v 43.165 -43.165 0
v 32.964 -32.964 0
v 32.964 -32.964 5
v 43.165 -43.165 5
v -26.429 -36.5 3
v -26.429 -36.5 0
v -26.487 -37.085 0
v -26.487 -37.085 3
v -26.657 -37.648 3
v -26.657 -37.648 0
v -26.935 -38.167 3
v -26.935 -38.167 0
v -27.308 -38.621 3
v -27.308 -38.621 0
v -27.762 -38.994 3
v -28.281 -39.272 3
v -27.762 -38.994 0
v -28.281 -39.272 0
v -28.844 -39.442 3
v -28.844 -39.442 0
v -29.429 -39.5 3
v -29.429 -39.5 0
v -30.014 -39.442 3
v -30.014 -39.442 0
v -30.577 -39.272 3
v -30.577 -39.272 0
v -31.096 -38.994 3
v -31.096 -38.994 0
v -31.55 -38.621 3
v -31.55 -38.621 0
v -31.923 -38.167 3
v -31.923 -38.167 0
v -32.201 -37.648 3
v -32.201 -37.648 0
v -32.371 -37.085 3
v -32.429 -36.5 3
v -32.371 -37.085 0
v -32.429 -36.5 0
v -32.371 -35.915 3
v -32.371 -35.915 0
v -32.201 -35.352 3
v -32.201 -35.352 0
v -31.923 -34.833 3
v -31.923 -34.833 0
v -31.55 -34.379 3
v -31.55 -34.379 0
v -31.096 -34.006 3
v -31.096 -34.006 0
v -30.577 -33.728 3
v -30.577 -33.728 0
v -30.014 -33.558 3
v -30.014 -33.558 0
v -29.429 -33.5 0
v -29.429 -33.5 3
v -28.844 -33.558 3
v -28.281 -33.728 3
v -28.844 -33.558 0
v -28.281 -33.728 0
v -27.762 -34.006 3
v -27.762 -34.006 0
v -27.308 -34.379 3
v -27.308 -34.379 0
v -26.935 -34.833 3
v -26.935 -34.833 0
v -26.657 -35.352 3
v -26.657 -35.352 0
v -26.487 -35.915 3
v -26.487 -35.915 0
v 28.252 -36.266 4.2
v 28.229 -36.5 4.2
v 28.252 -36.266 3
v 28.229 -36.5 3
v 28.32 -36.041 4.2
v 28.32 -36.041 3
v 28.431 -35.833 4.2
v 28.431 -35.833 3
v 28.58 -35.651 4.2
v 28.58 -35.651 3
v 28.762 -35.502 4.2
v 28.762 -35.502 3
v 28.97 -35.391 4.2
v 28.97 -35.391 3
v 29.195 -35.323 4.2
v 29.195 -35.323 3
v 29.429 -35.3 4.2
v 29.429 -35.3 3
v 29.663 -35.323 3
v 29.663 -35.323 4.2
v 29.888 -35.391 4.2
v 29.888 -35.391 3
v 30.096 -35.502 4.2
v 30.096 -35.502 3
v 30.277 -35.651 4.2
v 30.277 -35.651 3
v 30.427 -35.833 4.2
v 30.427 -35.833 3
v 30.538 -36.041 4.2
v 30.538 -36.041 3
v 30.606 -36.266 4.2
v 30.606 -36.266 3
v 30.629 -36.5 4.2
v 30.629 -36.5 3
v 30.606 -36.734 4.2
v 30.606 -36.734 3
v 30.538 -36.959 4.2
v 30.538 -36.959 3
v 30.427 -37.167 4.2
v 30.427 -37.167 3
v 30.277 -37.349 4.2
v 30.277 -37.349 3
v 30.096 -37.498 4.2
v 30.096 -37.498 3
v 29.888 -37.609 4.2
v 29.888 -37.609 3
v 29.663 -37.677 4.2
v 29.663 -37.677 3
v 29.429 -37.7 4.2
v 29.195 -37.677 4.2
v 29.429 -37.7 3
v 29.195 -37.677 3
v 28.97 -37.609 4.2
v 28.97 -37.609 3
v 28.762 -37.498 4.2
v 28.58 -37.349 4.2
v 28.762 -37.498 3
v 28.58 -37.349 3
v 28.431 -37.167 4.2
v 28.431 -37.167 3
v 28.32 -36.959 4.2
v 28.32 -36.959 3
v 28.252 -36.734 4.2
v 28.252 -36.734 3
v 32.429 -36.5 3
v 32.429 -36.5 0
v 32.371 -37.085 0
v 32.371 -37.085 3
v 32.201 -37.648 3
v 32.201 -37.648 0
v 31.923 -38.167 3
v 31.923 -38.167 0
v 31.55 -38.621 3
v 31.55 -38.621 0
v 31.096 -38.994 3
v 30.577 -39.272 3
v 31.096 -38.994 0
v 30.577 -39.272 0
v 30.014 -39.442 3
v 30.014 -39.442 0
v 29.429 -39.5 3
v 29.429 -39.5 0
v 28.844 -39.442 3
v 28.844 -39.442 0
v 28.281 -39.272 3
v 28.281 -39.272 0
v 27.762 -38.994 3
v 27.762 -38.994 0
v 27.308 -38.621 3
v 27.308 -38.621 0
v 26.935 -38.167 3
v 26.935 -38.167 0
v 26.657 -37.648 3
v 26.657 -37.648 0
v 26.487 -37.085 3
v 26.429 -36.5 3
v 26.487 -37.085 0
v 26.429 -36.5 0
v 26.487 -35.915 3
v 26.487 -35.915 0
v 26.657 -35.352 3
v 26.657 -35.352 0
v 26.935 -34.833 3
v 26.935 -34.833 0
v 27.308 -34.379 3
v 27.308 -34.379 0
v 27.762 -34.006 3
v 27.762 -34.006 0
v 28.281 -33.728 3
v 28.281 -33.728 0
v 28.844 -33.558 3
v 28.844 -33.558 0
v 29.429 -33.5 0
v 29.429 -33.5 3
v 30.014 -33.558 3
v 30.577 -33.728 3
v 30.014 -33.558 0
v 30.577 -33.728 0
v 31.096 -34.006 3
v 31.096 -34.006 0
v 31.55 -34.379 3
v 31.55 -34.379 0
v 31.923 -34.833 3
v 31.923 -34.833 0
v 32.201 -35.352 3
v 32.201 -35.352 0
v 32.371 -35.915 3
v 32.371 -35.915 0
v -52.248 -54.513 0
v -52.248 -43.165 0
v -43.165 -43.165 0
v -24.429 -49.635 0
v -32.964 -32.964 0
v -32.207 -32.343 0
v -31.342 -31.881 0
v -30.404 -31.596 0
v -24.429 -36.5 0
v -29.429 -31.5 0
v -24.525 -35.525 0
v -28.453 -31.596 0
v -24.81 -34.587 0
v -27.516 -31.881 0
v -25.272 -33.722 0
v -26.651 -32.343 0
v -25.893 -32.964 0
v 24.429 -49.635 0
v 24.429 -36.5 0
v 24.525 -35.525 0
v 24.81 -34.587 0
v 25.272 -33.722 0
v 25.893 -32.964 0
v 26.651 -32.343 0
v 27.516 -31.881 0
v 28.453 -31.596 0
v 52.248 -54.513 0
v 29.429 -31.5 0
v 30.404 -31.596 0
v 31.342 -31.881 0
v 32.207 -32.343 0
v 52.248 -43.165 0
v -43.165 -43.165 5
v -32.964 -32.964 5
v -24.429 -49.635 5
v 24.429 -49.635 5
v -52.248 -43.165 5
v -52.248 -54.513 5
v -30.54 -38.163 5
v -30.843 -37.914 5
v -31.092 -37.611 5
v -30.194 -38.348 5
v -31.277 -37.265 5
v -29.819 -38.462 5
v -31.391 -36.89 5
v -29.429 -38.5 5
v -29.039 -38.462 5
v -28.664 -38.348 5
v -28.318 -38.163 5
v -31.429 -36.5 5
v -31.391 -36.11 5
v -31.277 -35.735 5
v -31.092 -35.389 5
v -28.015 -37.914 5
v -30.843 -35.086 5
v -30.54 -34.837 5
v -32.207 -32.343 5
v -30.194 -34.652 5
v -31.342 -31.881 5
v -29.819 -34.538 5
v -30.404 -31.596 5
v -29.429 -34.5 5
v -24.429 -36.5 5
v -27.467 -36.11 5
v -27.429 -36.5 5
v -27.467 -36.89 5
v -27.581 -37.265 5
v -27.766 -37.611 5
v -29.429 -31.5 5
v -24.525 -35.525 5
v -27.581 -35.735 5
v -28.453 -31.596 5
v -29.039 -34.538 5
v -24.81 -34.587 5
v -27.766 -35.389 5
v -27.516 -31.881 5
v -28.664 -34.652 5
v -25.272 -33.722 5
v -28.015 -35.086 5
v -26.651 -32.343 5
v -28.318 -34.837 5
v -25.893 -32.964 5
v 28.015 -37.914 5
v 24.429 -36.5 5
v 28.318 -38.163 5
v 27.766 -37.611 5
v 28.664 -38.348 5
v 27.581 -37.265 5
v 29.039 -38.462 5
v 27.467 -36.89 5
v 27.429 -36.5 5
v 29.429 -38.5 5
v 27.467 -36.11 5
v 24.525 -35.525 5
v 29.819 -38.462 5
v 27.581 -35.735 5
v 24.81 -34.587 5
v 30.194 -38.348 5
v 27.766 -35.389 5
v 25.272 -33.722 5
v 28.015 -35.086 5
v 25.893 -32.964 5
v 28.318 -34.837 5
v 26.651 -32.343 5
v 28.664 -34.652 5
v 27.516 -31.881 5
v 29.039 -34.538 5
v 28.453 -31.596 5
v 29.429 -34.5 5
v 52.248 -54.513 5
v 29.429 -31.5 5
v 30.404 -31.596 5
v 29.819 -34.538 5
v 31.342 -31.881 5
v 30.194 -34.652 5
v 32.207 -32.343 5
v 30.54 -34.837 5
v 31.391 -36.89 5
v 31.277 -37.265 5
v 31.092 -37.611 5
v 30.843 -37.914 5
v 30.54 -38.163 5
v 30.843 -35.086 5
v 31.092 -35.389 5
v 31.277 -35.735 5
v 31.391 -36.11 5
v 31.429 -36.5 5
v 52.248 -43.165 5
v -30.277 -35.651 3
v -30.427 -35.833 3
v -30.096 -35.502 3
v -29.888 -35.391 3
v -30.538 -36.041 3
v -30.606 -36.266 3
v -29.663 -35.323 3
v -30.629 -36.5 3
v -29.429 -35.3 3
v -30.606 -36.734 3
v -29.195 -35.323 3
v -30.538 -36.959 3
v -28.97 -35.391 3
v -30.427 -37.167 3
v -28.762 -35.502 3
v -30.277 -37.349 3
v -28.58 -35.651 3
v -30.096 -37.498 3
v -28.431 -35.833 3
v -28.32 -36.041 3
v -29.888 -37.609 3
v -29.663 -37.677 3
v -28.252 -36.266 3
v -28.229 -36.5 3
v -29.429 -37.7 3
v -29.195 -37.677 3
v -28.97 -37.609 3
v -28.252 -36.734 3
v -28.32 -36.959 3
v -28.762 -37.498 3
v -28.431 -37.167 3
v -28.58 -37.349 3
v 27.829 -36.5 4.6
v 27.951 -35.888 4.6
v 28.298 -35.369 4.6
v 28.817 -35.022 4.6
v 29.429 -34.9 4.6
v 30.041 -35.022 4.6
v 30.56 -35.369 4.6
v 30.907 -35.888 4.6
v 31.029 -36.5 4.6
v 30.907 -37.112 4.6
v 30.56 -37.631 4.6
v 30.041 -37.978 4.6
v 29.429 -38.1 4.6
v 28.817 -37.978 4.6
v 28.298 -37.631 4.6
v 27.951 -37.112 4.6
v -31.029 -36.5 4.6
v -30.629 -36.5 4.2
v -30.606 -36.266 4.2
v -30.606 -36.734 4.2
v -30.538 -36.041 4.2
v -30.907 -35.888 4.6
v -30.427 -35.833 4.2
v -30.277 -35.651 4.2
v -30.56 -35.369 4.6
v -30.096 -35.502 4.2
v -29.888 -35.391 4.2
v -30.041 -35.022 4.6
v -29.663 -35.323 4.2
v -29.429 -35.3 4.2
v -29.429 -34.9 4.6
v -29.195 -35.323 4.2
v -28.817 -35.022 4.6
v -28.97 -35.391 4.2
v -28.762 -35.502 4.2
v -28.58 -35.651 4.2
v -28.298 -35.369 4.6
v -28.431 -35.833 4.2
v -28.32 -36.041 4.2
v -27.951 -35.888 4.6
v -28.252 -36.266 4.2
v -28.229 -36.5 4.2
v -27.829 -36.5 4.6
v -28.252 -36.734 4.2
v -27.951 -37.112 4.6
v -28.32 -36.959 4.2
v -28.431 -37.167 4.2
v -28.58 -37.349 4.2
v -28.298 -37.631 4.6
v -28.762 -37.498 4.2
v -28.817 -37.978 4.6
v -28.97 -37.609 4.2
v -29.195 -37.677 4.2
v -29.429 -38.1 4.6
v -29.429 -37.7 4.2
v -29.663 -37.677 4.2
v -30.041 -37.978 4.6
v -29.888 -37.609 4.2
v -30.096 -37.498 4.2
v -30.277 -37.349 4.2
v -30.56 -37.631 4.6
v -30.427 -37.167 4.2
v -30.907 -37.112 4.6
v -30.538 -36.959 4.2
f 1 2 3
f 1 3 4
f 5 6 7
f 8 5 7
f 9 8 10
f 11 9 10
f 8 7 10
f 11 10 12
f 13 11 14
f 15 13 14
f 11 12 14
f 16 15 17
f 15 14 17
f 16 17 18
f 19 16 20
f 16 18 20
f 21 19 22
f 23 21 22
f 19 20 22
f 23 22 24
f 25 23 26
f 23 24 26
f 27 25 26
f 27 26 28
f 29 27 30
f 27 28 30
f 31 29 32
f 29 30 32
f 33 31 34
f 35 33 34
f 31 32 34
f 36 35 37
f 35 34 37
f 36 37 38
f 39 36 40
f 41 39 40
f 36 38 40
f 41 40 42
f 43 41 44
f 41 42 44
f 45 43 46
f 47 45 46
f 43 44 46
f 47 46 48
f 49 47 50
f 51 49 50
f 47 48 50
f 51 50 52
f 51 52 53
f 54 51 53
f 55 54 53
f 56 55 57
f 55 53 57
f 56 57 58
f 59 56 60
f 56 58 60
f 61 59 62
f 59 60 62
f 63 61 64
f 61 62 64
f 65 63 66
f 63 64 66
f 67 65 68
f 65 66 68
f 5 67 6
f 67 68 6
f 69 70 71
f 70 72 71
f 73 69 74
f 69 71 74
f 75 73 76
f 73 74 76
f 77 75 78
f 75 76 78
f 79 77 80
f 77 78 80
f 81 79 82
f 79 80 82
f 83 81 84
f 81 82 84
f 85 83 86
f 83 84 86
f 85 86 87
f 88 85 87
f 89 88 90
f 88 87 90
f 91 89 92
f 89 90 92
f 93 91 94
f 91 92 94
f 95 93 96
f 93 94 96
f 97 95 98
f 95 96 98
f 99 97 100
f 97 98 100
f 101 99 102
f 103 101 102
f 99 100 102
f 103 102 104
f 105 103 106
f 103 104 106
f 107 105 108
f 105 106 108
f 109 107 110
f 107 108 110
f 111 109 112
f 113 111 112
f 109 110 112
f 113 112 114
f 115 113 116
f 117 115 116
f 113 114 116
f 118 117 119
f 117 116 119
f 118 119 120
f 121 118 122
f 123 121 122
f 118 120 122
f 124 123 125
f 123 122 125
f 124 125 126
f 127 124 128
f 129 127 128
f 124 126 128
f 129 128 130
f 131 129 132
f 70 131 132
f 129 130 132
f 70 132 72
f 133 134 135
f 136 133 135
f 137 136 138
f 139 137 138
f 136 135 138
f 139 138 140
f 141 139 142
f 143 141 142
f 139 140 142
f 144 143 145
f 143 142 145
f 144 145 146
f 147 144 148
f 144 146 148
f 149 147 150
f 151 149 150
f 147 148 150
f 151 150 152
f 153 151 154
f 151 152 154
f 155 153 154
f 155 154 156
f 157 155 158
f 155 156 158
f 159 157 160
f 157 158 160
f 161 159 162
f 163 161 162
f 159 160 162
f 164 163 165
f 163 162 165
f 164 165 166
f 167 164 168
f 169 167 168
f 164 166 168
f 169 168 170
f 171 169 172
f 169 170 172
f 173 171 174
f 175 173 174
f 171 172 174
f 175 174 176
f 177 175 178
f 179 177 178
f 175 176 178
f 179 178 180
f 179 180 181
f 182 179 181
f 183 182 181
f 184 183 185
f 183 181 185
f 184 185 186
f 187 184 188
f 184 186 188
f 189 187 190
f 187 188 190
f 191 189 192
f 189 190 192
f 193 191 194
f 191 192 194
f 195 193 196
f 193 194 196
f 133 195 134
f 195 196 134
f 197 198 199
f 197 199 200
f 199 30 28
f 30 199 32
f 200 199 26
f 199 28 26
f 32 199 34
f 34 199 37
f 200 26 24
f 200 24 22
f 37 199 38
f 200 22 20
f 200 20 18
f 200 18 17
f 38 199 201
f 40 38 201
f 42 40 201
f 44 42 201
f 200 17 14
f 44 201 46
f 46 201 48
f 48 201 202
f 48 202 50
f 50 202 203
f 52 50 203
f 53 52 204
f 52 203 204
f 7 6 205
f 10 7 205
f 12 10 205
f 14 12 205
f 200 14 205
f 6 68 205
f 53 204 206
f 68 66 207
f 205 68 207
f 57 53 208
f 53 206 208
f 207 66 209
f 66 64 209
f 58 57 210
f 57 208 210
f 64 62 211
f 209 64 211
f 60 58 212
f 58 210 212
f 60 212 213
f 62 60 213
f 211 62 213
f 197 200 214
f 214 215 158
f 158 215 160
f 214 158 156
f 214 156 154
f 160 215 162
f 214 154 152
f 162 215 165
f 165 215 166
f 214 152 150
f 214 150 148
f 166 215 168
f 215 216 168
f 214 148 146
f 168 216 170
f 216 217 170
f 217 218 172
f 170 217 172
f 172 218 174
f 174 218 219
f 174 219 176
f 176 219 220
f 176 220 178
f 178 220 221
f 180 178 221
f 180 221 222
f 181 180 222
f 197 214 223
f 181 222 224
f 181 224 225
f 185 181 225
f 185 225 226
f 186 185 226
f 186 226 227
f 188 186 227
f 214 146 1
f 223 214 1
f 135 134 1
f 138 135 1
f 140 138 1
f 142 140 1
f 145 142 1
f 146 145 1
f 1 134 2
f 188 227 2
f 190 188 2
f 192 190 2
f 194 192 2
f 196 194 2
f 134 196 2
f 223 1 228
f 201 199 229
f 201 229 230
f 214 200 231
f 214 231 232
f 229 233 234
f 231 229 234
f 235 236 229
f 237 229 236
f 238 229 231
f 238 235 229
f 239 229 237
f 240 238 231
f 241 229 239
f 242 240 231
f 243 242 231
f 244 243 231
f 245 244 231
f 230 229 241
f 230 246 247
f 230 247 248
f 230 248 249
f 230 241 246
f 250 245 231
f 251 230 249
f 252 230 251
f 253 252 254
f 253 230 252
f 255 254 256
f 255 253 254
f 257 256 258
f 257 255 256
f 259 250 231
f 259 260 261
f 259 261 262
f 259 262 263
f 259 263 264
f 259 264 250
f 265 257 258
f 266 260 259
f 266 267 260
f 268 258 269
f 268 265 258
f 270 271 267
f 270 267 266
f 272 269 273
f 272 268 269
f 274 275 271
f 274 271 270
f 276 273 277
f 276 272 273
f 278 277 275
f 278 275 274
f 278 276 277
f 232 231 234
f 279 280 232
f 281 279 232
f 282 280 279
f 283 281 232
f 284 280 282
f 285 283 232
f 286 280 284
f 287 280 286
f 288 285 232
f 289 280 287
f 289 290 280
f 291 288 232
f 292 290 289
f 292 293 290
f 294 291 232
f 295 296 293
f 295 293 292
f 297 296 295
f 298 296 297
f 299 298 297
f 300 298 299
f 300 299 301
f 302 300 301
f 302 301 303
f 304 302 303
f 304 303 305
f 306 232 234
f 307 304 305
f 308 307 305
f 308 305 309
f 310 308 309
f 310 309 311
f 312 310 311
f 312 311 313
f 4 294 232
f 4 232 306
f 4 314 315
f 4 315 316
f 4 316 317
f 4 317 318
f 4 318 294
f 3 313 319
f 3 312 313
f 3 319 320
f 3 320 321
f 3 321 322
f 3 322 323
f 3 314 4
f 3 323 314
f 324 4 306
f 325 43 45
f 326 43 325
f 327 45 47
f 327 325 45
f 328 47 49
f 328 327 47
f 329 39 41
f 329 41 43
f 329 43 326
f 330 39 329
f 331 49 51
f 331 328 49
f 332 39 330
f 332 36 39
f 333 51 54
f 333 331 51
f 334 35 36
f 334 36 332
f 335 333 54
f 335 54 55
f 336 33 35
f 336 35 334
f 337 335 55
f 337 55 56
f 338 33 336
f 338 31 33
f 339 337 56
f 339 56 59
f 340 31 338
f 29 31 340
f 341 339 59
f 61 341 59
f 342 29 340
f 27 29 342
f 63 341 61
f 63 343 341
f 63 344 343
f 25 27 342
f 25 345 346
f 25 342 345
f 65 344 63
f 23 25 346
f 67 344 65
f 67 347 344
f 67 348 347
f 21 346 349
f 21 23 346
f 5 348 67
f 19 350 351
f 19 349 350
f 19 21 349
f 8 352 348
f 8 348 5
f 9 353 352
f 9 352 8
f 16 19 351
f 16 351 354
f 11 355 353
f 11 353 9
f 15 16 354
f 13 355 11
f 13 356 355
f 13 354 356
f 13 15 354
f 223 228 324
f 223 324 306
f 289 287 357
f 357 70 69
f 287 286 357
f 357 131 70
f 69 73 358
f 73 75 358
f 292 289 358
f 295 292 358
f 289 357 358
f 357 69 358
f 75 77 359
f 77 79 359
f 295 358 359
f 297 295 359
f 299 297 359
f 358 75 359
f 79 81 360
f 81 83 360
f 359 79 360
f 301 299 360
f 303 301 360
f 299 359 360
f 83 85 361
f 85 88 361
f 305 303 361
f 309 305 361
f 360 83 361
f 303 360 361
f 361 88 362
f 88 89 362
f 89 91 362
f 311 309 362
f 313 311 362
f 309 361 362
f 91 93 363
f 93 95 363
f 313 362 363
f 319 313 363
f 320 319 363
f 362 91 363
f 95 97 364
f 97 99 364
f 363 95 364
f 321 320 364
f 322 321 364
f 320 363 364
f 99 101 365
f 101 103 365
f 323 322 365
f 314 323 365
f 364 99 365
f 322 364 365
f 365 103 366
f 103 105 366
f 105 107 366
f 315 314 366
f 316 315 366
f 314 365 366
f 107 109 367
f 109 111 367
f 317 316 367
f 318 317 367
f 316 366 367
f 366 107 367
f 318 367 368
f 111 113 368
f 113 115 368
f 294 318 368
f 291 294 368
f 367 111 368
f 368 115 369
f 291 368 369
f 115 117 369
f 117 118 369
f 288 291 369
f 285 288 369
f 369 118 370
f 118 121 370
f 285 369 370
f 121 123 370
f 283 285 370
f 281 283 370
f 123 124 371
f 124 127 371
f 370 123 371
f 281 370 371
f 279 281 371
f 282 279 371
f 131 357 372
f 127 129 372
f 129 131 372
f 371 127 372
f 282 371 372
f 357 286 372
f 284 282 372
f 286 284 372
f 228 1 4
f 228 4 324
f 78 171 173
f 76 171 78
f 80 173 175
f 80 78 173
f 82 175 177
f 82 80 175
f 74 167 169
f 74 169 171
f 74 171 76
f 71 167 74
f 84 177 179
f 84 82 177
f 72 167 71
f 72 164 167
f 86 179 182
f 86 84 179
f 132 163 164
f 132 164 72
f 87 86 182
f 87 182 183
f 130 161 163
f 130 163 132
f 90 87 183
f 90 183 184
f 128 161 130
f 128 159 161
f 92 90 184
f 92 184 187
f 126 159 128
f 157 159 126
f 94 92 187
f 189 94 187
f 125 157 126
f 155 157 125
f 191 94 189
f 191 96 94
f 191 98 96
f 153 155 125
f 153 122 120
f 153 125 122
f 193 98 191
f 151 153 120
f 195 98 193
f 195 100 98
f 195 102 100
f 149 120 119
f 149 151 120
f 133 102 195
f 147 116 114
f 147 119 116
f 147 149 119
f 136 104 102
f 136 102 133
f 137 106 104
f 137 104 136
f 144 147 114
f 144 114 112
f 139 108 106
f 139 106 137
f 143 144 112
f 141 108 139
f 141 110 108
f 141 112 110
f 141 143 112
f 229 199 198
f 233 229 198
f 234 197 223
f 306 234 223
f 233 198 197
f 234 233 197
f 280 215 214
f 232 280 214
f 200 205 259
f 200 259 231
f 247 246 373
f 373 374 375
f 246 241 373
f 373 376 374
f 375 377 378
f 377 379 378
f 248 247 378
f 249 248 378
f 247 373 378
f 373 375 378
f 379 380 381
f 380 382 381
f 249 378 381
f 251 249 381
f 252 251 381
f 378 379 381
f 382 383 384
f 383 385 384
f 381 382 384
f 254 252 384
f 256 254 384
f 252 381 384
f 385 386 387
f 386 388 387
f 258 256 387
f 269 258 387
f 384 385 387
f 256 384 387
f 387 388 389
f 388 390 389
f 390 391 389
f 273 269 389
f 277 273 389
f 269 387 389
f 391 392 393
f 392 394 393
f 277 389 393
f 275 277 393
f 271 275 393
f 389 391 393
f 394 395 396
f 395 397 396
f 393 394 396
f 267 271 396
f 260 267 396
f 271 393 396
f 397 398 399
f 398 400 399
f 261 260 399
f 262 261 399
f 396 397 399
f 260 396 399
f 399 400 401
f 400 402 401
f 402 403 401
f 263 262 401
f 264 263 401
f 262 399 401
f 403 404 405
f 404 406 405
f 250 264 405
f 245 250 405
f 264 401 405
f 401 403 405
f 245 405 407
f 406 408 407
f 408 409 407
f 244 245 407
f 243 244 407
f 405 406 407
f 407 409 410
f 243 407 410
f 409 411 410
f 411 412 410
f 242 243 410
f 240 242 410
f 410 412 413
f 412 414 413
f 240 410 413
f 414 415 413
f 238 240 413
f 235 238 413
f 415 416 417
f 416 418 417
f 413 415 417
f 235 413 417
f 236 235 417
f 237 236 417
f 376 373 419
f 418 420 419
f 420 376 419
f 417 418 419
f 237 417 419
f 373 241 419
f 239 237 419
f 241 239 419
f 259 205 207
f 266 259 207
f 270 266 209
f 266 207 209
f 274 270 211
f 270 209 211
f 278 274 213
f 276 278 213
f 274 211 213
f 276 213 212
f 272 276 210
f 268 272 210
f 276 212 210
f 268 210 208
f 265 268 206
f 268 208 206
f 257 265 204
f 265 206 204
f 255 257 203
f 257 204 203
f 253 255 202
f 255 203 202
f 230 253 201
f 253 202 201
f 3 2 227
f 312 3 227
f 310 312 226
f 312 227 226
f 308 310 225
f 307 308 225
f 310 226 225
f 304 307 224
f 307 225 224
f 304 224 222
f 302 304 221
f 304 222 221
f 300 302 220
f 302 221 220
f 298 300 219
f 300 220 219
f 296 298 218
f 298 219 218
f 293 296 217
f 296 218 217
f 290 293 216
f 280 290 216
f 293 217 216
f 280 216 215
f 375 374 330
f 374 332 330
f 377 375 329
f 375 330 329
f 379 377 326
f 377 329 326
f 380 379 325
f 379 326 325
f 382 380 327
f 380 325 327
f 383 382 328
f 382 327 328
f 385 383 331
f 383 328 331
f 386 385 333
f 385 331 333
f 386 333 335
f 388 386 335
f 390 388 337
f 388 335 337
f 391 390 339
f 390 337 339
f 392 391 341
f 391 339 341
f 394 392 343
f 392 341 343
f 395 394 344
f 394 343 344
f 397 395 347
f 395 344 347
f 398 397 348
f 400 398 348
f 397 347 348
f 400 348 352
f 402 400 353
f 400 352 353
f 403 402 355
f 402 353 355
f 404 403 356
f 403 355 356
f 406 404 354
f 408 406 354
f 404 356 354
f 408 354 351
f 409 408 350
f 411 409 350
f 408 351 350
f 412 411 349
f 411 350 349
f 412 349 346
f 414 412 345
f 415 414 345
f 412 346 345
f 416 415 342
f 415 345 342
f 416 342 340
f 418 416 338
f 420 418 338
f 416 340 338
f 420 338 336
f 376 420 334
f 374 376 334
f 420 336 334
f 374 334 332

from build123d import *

# Parameters (mm, degrees)
PAD_DEPTH        = 5
SKETCH_R         = 3
POCKET_DEPTH     = 3
HOLE_D           = 2.4
HOLE_CSINK_D     = 4
HOLE_CSINK_ANGLE = 90


with BuildPart() as part:
    # Sketch_1 → Pad (new body)
    with BuildSketch(Plane.XY):
        with BuildLine():
            ThreePointArc((-24.428932, -36.5), (-27.515515, -31.880602), (-32.964466, -32.964466))
            Line((-43.16455, -43.16455), (-32.964466, -32.964466))
            Line((-43.16455, -43.16455), (-52.247863, -43.16455))
            Line((-52.247863, -43.16455), (-52.247863, -54.512786))
            Line((-52.247863, -54.512786), (52.247863, -54.512786))
            Line((52.247863, -43.16455), (52.247863, -54.512786))
            Line((43.16455, -43.16455), (52.247863, -43.16455))
            Line((32.964466, -32.964466), (43.16455, -43.16455))
            ThreePointArc((32.964466, -32.964466), (27.515515, -31.880602), (24.428932, -36.5))
            Line((24.428932, -36.5), (24.428932, -49.634615))
            Line((-24.428932, -49.634615), (24.428932, -49.634615))
            Line((-24.428932, -36.5), (-24.428932, -49.634615))
        make_face()
    extrude(amount=PAD_DEPTH)

    # Sketch (on Face13 of Pad) → Pocket (cut)
    with BuildSketch(Plane(origin=(0, 0, 0), x_dir=(1, 0, 0), z_dir=(0, 0, -1))):
        with Locations((-29.428932, 36.5)):
            Circle(SKETCH_R)
        with Locations((29.428932, 36.5)):
            Circle(SKETCH_R)
    extrude(amount=-POCKET_DEPTH, mode=Mode.SUBTRACT)

    # Hole (through all)
    with Locations(Plane.XY.offset(5)):
        with Locations((-29.428932, -36.5), (29.428932, -36.5)):
            CounterSinkHole(HOLE_D / 2, HOLE_CSINK_D / 2, counter_sink_angle=HOLE_CSINK_ANGLE)


solid = part.part
